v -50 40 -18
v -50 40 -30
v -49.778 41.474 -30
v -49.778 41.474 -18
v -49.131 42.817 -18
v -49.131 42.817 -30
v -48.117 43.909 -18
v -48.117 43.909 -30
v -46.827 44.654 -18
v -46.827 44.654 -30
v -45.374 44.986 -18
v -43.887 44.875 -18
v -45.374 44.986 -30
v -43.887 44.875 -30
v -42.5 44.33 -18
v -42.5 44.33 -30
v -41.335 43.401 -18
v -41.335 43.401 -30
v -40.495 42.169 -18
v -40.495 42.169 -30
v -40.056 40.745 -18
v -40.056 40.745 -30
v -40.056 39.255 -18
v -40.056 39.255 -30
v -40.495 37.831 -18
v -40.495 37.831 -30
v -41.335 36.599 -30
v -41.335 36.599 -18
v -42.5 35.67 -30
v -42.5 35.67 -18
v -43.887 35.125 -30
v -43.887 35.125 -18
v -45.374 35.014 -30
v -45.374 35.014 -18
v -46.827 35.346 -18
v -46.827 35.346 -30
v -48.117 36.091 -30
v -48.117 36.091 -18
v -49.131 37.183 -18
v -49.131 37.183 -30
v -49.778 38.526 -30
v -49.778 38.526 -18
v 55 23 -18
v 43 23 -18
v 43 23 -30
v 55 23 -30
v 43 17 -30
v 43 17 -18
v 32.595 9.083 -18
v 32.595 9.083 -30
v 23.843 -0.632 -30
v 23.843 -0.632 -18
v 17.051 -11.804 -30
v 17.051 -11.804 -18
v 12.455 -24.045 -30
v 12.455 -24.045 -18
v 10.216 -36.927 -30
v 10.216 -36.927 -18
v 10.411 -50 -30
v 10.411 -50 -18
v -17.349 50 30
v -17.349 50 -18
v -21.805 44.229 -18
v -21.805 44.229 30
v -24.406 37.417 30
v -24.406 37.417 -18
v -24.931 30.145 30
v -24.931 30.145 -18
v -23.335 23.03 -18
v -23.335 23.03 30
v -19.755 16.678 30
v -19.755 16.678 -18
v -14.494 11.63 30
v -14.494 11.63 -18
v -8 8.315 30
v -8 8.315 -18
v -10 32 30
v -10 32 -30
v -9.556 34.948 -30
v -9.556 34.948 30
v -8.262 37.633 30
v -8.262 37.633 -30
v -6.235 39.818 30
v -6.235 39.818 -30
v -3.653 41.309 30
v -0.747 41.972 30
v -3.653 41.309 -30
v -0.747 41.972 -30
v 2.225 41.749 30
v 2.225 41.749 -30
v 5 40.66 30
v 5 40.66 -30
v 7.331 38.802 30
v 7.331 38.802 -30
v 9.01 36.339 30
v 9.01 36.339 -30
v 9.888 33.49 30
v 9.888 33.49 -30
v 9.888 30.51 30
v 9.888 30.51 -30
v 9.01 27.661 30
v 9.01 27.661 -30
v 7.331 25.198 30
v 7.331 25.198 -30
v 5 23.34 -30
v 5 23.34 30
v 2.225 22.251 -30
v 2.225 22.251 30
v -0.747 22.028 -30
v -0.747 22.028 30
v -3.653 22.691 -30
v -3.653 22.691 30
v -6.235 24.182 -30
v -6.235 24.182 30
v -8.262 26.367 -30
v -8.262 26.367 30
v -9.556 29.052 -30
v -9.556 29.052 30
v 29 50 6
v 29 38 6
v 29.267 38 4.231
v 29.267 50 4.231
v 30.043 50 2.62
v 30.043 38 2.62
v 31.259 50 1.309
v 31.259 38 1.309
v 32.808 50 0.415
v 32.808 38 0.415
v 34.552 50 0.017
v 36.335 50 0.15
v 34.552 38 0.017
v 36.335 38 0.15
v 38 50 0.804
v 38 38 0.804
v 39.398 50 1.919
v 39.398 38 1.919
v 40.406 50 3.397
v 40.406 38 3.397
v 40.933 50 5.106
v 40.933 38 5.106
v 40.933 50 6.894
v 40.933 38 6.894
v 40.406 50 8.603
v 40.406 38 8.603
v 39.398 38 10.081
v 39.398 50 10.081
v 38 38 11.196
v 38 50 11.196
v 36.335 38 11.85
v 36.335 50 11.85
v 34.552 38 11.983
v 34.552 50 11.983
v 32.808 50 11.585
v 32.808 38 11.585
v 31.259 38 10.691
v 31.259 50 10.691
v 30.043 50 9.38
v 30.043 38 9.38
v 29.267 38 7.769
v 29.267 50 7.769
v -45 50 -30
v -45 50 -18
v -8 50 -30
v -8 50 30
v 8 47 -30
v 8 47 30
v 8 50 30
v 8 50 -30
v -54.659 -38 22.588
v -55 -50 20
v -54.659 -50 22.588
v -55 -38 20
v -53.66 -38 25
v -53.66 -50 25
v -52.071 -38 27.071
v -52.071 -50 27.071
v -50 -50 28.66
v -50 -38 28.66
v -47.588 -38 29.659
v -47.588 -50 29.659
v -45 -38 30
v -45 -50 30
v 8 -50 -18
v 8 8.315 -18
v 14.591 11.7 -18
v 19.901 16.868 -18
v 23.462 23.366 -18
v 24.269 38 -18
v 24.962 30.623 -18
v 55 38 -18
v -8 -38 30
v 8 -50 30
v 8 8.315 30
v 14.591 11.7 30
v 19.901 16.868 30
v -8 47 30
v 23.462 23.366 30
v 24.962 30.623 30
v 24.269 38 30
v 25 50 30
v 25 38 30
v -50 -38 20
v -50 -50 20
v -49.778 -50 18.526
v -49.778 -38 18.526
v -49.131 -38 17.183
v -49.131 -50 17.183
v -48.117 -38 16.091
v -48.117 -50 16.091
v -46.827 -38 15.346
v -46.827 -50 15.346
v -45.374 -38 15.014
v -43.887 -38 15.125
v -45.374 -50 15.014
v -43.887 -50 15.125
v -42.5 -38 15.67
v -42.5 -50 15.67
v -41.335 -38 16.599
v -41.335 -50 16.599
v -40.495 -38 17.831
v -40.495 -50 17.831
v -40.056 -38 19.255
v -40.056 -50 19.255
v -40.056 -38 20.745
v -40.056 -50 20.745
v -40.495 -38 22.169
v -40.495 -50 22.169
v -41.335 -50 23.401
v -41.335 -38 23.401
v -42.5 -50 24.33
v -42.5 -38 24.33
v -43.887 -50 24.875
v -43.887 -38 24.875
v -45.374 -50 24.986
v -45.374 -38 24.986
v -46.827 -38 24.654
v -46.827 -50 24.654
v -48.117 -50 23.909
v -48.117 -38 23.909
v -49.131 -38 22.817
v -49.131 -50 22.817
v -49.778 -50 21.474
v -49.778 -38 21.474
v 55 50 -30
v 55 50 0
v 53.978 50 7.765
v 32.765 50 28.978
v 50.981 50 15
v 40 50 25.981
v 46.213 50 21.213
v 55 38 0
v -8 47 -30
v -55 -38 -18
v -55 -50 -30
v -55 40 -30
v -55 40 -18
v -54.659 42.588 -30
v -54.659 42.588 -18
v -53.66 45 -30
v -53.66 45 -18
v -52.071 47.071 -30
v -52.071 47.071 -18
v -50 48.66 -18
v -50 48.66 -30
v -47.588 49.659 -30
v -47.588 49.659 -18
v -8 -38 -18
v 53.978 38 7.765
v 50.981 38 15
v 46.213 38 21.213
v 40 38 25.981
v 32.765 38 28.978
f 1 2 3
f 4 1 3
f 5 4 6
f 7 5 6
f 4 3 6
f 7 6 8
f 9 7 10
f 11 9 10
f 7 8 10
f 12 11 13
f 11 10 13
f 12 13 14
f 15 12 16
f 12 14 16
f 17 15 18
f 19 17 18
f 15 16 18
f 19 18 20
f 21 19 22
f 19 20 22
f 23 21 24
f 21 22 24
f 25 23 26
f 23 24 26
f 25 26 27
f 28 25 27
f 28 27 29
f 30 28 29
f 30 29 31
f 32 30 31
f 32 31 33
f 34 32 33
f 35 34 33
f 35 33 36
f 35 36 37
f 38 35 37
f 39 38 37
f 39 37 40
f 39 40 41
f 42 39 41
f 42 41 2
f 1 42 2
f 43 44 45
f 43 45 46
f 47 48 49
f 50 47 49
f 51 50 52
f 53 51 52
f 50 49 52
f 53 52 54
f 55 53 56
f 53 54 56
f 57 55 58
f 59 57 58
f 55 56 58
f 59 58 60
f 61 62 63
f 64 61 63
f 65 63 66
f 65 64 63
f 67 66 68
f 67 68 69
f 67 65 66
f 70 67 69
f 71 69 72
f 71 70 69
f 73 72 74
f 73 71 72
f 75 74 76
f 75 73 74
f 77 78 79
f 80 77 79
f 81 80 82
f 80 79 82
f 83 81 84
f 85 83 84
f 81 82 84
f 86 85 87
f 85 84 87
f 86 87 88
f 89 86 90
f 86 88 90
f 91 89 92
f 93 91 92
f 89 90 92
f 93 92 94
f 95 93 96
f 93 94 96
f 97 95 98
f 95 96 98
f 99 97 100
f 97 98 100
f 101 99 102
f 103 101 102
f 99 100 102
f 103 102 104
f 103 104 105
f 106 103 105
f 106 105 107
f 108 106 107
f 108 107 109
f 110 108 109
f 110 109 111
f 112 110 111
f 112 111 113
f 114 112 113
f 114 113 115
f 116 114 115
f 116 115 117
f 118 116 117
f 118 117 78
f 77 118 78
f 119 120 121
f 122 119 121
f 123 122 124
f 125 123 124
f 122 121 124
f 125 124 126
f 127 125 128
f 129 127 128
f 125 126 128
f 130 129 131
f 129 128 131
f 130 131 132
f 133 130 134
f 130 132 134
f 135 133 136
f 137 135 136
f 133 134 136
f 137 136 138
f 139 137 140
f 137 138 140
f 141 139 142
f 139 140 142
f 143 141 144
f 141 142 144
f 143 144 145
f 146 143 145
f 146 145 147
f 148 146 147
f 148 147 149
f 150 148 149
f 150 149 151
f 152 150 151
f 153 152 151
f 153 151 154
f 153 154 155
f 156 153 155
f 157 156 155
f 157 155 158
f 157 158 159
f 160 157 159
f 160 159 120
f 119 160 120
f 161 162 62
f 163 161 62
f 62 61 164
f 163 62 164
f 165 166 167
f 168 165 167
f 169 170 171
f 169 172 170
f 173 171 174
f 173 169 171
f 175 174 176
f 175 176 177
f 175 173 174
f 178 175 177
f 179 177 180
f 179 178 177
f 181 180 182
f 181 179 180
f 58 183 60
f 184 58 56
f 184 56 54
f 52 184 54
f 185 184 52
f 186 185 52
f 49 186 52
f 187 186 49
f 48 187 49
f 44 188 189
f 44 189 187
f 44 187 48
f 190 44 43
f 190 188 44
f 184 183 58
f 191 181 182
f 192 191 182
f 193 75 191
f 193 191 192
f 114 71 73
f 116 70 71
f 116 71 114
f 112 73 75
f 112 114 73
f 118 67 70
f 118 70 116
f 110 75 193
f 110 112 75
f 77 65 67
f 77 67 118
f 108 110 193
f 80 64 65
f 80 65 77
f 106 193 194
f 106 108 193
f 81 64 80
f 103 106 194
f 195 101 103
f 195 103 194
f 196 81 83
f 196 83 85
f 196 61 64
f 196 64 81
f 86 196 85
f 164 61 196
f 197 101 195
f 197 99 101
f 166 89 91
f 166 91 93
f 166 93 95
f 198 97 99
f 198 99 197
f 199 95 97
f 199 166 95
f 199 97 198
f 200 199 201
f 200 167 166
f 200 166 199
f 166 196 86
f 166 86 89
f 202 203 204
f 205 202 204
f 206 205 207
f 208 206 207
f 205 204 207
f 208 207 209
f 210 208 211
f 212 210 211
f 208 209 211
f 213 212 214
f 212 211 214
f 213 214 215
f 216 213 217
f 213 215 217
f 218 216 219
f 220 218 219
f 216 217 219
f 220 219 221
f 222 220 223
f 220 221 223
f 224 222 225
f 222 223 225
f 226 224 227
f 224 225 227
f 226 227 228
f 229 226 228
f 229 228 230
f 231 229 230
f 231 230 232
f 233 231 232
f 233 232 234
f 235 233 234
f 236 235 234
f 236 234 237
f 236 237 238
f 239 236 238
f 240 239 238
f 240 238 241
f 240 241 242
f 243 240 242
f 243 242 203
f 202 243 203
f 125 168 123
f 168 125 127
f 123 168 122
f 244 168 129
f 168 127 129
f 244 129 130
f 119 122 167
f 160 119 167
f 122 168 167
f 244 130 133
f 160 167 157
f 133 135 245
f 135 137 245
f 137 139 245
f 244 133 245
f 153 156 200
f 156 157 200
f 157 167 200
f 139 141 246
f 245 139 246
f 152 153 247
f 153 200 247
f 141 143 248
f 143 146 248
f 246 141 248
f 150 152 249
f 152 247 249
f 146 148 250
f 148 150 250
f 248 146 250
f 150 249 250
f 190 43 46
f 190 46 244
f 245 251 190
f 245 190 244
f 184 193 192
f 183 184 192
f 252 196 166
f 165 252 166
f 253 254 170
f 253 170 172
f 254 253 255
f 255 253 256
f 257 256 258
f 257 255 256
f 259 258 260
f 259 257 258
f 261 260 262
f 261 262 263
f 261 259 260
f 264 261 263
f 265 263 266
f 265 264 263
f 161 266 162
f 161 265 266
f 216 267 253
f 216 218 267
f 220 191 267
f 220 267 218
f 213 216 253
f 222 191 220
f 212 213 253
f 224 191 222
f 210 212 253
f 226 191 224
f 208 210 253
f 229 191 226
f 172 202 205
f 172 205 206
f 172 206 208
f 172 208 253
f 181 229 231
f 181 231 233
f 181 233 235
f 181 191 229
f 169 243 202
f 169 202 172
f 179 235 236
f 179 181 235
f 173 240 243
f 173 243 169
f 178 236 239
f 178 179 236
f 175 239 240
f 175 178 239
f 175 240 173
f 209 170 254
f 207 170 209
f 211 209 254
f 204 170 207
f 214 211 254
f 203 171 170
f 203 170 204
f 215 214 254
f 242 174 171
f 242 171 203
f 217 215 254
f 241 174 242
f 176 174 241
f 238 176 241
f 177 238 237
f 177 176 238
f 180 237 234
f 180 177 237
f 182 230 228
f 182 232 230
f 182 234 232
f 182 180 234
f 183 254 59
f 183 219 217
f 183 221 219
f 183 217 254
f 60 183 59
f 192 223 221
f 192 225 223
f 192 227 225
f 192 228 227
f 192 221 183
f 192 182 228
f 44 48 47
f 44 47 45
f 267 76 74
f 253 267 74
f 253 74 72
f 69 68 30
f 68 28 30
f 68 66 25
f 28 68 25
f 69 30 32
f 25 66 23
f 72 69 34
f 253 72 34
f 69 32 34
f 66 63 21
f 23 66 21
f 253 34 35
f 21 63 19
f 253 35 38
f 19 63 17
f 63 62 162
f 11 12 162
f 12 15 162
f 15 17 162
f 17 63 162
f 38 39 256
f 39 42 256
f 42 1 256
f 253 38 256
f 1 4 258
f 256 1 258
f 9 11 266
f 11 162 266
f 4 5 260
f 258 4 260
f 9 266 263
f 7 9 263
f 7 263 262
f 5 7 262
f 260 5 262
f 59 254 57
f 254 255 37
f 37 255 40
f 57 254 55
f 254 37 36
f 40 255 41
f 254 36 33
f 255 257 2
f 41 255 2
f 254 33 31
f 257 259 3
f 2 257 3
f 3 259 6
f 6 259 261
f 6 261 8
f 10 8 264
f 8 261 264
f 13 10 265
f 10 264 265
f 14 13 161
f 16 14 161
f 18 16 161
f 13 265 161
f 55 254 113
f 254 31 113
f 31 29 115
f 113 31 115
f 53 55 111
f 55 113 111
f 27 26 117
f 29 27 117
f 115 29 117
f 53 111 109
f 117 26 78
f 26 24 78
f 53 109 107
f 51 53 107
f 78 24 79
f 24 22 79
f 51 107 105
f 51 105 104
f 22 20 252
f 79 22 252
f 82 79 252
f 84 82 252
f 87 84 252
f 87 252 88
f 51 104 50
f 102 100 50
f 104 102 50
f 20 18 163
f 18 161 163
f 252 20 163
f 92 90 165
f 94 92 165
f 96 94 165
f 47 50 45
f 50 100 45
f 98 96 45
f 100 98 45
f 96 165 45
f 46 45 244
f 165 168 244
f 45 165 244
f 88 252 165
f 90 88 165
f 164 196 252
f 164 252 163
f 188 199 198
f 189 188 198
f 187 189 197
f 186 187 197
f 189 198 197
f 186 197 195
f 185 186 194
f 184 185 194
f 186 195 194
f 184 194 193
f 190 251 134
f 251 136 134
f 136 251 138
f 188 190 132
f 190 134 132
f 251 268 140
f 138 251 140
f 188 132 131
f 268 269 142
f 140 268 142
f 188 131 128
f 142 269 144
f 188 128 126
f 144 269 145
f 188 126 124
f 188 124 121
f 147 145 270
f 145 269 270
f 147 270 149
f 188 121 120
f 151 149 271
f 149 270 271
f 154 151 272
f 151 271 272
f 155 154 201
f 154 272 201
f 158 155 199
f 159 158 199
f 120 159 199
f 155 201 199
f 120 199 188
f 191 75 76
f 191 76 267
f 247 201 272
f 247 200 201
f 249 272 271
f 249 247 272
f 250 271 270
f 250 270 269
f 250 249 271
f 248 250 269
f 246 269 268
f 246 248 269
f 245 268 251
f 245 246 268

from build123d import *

# Parameters (mm, degrees)
SKETCH1_W           = 110
SKETCH1_H           = 100
BOSS_EXTRUDE1_DEPTH = 30
CUT_EXTRUDE1_DEPTH  = 48
SKETCH3_W           = 12
SKETCH3_H           = 6
CUT_EXTRUDE2_DEPTH  = 96.524865873
CUT_EXTRUDE5_DEPTH  = 48
CUT_EXTRUDE6_DEPTH  = 96.524865873
HOLE1_D             = 20
FILLET1_R           = 10
FILLET2_R           = 30
HOLE2_D             = 12
HOLE3_D             = 10
HOLE4_D             = 10
SKETCH15_W          = 16
SKETCH15_H          = 3
CUT_EXTRUDE7_DEPTH  = 96.524865873


with BuildPart() as part:
    # Sketch1 → Boss-Extrude1 (new, symmetric)
    with BuildSketch(Plane.XY):
        Rectangle(SKETCH1_W, SKETCH1_H)
    extrude(amount=BOSS_EXTRUDE1_DEPTH, both=True)

    # Sketch2 → Cut-Extrude1 (cut)
    with BuildSketch(Plane.XY.offset(30)):
        with BuildLine():
            Line((-8, 8.314561435), (-8, -38))
            Line((-8, -38), (-55, -38))
            Line((-55, -38), (-55, 50))
            Line((-55, 50), (-17.349351573, 50))
            ThreePointArc((-17.349351573, 50), (-24.393981909, 26.528834985), (-8, 8.314561435))
        make_face()
    extrude(amount=-CUT_EXTRUDE1_DEPTH, mode=Mode.SUBTRACT)

    # Sketch3 → Cut-Extrude2 (cut, through all)
    with BuildSketch(Plane.XY.offset(30)):
        with Locations((49, 20)):
            Rectangle(SKETCH3_W, SKETCH3_H)
    extrude(amount=-CUT_EXTRUDE2_DEPTH, mode=Mode.SUBTRACT)

    # Sketch4 → Cut-Extrude5 (cut)
    with BuildSketch(Plane.XY.offset(30)):
        with BuildLine():
            Line((8, -50), (10.411371468, -50))
            ThreePointArc((10.411371468, -50), (17.051338909, -11.804150412), (43, 17))
            Line((43, 17), (43, 23))
            Line((43, 23), (55, 23))
            Line((55, 23), (55, 38))
            Line((55, 38), (24.269322199, 38))
            ThreePointArc((24.269322199, 38), (21.92335751, 19.984743219), (8, 8.314561435))
            Line((8, 8.314561435), (8, -50))
        make_face()
    extrude(amount=-CUT_EXTRUDE5_DEPTH, mode=Mode.SUBTRACT)

    # Sketch6 → Cut-Extrude6 (cut, through all)
    with BuildSketch(Plane.XY.offset(30)):
        with BuildLine():
            Line((55, -50), (55, 17))
            Line((55, 17), (43, 17))
            ThreePointArc((43, 17), (17.051338909, -11.804150412), (10.411371468, -50))
            Line((10.411371468, -50), (55, -50))
        make_face()
    extrude(amount=-CUT_EXTRUDE6_DEPTH, mode=Mode.SUBTRACT)

    # Hole1 (through all)
    with Locations(Plane.XY.offset(30)):
        with Locations((0, 32)):
            Hole(HOLE1_D / 2)

    # Fillet1
    fillet1_edges = [part.edges().sort_by_distance(p)[0] for p in [
        (-55, -44, 30),
        (-55, 50, -24),
    ]]
    fillet(fillet1_edges, radius=FILLET1_R)

    # Fillet2
    fillet2_edges = [part.edges().sort_by_distance(p)[0] for p in [
        (55, 44, 30),
    ]]
    fillet(fillet2_edges, radius=FILLET2_R)

    # Hole2 (through all)
    with Locations(Plane(origin=(0, 50, 0), x_dir=(1, 0, 0), z_dir=(0, 1, 0))):
        with Locations((35, -6)):
            Hole(HOLE2_D / 2)

    # Hole3 (through all)
    with Locations(Plane(origin=(0, -38, 0), x_dir=(1, 0, 0), z_dir=(0, 1, 0))):
        with Locations((-45, -20)):
            Hole(HOLE3_D / 2)

    # Hole4 (through all)
    with Locations(Plane.XY.offset(-18)):
        with Locations((-45, 40)):
            Hole(HOLE4_D / 2)

    # Sketch15 → Cut-Extrude7 (cut, through all)
    with BuildSketch(Plane.XY.offset(30)):
        with Locations((0, 48.5)):
            Rectangle(SKETCH15_W, SKETCH15_H)
    extrude(amount=-CUT_EXTRUDE7_DEPTH, mode=Mode.SUBTRACT)


solid = part.part
